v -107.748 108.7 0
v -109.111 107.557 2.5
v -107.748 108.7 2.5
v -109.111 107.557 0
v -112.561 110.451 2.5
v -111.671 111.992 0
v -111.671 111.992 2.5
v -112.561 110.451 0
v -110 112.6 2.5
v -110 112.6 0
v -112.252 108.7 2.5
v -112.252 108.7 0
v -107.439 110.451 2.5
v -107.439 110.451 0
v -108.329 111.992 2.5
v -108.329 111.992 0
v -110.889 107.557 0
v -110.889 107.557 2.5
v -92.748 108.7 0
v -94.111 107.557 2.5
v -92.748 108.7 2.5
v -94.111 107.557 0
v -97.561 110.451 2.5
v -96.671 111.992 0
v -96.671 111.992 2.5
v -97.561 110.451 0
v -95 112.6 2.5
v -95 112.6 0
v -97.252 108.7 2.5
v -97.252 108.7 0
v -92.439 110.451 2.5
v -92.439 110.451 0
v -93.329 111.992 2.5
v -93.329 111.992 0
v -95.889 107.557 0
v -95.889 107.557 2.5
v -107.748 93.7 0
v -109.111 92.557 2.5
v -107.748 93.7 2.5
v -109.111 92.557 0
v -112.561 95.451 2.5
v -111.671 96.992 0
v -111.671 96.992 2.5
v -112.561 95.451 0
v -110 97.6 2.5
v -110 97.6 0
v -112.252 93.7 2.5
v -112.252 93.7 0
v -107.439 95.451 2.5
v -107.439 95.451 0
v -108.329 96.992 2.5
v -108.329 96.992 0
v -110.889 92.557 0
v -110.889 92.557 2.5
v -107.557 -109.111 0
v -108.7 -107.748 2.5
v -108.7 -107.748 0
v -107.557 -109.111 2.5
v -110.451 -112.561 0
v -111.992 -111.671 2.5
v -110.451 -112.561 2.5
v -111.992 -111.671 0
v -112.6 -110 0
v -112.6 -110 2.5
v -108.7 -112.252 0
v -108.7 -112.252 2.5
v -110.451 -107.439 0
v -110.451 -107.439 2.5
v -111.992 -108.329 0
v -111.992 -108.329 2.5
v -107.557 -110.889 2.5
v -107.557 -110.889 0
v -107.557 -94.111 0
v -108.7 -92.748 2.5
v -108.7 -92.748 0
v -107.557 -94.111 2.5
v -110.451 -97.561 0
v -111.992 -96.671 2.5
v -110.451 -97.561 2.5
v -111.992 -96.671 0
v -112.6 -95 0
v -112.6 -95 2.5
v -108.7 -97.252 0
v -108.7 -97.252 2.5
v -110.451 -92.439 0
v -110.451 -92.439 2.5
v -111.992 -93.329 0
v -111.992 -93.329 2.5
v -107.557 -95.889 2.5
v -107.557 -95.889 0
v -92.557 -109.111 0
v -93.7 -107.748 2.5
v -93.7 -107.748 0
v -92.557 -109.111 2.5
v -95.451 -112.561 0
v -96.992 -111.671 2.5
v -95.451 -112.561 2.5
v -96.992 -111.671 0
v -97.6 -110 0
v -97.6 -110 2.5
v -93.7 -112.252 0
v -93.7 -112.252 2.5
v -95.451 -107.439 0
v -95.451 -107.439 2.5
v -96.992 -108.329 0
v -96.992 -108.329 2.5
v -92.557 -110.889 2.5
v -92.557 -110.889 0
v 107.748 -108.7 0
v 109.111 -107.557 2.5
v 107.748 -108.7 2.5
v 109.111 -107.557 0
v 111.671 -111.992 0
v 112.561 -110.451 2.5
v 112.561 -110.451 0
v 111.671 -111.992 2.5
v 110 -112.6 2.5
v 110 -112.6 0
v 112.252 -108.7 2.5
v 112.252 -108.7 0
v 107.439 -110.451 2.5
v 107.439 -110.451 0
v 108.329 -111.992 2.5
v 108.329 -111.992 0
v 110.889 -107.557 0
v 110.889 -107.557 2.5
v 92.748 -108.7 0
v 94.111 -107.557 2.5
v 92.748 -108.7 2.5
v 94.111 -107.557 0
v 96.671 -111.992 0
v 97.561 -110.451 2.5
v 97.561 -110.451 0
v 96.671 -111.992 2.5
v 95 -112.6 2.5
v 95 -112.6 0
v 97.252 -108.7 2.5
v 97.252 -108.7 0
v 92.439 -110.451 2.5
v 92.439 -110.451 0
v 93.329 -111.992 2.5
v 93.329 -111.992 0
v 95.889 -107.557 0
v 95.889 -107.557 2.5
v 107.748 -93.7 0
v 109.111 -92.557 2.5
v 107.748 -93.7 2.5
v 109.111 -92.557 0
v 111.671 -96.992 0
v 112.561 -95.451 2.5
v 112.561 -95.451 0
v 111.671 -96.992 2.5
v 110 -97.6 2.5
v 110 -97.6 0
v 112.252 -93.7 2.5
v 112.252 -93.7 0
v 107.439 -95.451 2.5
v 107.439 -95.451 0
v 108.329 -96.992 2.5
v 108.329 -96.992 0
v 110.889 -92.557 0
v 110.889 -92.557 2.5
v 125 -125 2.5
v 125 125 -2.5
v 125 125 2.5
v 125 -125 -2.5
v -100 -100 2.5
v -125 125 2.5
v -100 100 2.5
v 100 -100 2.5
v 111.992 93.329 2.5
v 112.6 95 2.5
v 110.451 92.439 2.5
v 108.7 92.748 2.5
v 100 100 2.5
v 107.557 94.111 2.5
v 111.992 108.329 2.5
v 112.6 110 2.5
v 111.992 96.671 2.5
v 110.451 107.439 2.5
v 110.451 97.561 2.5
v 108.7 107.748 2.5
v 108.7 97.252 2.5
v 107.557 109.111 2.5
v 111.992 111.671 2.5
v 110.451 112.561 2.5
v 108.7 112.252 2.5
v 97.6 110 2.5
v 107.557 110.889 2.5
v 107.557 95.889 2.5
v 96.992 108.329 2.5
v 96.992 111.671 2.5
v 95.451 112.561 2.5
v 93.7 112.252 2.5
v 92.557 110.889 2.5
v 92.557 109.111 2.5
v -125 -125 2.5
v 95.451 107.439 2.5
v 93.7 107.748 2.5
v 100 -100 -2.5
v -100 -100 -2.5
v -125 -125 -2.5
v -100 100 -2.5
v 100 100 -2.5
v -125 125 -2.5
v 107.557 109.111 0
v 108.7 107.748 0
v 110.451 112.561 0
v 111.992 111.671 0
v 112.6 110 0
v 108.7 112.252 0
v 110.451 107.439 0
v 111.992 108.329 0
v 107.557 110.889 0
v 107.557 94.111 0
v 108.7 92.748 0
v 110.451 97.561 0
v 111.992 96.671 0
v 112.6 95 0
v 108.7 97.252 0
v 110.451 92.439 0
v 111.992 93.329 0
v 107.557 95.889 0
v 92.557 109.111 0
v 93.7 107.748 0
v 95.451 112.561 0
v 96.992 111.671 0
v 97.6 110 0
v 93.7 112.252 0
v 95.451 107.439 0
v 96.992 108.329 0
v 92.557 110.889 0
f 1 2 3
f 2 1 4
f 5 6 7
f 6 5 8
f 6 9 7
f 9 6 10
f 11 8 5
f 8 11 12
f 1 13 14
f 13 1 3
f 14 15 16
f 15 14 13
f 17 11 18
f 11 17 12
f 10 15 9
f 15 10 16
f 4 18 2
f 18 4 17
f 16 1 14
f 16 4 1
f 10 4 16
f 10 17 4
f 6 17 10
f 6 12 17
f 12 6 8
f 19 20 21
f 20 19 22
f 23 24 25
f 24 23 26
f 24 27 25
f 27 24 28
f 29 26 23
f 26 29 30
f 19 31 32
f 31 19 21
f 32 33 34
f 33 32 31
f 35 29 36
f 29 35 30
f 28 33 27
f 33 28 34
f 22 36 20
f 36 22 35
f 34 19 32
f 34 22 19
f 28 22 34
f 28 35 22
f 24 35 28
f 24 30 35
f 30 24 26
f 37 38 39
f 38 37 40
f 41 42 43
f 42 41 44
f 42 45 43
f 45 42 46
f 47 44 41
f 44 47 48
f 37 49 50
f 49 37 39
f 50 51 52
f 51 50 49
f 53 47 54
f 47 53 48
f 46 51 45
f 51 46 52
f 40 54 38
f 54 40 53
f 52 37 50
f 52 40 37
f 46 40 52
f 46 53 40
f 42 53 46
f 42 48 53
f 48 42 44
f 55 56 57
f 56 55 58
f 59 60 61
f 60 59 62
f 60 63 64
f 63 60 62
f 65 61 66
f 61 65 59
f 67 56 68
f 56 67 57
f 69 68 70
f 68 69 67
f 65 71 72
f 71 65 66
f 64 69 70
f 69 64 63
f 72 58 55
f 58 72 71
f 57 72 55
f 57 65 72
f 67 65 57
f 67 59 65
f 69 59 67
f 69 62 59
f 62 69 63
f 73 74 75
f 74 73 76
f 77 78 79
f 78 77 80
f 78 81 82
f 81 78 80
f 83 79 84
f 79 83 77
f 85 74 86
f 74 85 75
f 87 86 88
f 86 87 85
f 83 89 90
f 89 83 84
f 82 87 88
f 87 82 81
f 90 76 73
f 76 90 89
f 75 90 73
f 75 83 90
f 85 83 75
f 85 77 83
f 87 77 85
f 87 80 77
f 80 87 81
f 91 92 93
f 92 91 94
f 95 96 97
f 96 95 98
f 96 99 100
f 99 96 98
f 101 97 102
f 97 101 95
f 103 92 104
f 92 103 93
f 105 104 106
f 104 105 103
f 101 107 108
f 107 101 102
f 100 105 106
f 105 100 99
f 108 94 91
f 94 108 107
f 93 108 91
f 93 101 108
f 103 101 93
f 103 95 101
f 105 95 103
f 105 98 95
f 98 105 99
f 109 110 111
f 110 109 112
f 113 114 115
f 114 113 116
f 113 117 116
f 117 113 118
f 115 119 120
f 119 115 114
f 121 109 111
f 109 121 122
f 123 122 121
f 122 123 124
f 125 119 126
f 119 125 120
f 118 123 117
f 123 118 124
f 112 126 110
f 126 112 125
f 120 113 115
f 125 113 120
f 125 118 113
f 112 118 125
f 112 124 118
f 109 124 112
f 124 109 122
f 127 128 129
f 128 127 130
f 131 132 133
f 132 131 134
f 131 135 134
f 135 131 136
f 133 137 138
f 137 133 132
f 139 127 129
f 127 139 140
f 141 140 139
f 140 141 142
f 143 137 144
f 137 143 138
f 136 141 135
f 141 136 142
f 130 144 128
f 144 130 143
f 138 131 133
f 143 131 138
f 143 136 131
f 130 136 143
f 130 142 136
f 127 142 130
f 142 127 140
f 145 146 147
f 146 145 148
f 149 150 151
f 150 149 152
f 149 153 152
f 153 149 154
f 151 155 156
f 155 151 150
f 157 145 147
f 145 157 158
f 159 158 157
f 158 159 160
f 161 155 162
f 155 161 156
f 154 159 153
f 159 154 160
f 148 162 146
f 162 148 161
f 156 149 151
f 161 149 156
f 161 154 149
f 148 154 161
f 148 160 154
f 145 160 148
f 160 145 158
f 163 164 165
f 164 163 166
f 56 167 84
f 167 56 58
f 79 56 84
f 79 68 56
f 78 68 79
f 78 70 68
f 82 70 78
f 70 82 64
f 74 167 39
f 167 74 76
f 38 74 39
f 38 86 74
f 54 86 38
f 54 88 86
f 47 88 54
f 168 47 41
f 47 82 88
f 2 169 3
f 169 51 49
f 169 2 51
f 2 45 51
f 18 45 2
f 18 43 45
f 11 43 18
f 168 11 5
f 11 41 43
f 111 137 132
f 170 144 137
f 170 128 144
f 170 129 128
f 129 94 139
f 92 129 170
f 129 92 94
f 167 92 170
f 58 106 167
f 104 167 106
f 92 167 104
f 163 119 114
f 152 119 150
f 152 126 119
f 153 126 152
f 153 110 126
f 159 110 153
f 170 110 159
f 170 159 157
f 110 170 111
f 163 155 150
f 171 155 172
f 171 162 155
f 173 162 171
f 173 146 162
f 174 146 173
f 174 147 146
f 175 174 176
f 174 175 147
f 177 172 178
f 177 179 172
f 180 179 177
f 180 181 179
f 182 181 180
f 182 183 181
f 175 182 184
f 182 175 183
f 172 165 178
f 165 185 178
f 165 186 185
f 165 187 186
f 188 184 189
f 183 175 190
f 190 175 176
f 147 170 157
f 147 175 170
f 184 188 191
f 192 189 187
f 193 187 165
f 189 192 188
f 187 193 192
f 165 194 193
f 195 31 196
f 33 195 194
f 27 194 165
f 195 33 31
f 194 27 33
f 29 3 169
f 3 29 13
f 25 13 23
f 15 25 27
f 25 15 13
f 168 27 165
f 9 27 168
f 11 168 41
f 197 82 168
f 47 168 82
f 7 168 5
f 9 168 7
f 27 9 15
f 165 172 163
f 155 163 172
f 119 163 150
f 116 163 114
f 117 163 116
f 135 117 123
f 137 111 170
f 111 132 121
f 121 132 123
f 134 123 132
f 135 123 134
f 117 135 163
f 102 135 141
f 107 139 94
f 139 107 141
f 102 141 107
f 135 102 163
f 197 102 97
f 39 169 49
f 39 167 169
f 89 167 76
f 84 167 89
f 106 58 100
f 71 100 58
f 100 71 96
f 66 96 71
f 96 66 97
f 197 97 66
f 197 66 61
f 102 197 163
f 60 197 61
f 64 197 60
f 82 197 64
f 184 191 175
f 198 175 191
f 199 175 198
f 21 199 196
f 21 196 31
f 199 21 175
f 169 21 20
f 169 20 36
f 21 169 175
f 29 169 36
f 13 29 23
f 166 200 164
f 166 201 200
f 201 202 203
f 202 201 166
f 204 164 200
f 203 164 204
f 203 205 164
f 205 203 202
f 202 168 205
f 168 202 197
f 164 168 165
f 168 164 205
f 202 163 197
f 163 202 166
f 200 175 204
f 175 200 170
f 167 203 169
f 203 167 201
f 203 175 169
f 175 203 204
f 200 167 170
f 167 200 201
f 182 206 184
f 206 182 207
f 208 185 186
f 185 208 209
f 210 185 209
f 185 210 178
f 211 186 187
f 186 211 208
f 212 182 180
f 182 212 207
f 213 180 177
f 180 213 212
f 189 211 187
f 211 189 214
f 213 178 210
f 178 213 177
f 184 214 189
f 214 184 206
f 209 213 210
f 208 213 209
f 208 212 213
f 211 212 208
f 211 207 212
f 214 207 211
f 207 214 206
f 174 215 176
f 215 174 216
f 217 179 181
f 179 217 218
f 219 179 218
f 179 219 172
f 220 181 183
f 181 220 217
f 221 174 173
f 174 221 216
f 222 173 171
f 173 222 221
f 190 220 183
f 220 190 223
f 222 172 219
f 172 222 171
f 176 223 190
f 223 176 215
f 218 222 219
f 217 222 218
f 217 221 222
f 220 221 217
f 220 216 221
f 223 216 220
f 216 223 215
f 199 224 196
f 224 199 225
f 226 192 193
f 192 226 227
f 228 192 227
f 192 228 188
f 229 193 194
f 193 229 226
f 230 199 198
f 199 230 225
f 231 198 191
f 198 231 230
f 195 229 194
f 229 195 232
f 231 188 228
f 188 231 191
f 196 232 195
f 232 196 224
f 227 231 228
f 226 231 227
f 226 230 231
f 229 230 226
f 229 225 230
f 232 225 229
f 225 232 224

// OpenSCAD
l=250;
d=15;

difference(){
cube([l,l,5],center=true);
cube([l-50,l-50,10],center=true);
    
translate([l/2-d,l/2-d,0])cylinder(d=5.2,h=10);
translate([l/2-d,l/2-2*d,0])cylinder(d=5.2,h=10);
translate([l/2-2*d,l/2-d,0])cylinder(d=5.2,h=10);

rotate([0,0,90]){
translate([l/2-d,l/2-d,0])cylinder(d=5.2,h=10);
translate([l/2-d,l/2-2*d,0])cylinder(d=5.2,h=10);
translate([l/2-2*d,l/2-d,0])cylinder(d=5.2,h=10);
}

rotate([0,0,180]){
translate([l/2-d,l/2-d,0])cylinder(d=5.2,h=10);
translate([l/2-d,l/2-2*d,0])cylinder(d=5.2,h=10);
translate([l/2-2*d,l/2-d,0])cylinder(d=5.2,h=10);
}

rotate([0,0,270]){
translate([l/2-d,l/2-d,0])cylinder(d=5.2,h=10);
translate([l/2-d,l/2-2*d,0])cylinder(d=5.2,h=10);
translate([l/2-2*d,l/2-d,0])cylinder(d=5.2,h=10);
}

}
